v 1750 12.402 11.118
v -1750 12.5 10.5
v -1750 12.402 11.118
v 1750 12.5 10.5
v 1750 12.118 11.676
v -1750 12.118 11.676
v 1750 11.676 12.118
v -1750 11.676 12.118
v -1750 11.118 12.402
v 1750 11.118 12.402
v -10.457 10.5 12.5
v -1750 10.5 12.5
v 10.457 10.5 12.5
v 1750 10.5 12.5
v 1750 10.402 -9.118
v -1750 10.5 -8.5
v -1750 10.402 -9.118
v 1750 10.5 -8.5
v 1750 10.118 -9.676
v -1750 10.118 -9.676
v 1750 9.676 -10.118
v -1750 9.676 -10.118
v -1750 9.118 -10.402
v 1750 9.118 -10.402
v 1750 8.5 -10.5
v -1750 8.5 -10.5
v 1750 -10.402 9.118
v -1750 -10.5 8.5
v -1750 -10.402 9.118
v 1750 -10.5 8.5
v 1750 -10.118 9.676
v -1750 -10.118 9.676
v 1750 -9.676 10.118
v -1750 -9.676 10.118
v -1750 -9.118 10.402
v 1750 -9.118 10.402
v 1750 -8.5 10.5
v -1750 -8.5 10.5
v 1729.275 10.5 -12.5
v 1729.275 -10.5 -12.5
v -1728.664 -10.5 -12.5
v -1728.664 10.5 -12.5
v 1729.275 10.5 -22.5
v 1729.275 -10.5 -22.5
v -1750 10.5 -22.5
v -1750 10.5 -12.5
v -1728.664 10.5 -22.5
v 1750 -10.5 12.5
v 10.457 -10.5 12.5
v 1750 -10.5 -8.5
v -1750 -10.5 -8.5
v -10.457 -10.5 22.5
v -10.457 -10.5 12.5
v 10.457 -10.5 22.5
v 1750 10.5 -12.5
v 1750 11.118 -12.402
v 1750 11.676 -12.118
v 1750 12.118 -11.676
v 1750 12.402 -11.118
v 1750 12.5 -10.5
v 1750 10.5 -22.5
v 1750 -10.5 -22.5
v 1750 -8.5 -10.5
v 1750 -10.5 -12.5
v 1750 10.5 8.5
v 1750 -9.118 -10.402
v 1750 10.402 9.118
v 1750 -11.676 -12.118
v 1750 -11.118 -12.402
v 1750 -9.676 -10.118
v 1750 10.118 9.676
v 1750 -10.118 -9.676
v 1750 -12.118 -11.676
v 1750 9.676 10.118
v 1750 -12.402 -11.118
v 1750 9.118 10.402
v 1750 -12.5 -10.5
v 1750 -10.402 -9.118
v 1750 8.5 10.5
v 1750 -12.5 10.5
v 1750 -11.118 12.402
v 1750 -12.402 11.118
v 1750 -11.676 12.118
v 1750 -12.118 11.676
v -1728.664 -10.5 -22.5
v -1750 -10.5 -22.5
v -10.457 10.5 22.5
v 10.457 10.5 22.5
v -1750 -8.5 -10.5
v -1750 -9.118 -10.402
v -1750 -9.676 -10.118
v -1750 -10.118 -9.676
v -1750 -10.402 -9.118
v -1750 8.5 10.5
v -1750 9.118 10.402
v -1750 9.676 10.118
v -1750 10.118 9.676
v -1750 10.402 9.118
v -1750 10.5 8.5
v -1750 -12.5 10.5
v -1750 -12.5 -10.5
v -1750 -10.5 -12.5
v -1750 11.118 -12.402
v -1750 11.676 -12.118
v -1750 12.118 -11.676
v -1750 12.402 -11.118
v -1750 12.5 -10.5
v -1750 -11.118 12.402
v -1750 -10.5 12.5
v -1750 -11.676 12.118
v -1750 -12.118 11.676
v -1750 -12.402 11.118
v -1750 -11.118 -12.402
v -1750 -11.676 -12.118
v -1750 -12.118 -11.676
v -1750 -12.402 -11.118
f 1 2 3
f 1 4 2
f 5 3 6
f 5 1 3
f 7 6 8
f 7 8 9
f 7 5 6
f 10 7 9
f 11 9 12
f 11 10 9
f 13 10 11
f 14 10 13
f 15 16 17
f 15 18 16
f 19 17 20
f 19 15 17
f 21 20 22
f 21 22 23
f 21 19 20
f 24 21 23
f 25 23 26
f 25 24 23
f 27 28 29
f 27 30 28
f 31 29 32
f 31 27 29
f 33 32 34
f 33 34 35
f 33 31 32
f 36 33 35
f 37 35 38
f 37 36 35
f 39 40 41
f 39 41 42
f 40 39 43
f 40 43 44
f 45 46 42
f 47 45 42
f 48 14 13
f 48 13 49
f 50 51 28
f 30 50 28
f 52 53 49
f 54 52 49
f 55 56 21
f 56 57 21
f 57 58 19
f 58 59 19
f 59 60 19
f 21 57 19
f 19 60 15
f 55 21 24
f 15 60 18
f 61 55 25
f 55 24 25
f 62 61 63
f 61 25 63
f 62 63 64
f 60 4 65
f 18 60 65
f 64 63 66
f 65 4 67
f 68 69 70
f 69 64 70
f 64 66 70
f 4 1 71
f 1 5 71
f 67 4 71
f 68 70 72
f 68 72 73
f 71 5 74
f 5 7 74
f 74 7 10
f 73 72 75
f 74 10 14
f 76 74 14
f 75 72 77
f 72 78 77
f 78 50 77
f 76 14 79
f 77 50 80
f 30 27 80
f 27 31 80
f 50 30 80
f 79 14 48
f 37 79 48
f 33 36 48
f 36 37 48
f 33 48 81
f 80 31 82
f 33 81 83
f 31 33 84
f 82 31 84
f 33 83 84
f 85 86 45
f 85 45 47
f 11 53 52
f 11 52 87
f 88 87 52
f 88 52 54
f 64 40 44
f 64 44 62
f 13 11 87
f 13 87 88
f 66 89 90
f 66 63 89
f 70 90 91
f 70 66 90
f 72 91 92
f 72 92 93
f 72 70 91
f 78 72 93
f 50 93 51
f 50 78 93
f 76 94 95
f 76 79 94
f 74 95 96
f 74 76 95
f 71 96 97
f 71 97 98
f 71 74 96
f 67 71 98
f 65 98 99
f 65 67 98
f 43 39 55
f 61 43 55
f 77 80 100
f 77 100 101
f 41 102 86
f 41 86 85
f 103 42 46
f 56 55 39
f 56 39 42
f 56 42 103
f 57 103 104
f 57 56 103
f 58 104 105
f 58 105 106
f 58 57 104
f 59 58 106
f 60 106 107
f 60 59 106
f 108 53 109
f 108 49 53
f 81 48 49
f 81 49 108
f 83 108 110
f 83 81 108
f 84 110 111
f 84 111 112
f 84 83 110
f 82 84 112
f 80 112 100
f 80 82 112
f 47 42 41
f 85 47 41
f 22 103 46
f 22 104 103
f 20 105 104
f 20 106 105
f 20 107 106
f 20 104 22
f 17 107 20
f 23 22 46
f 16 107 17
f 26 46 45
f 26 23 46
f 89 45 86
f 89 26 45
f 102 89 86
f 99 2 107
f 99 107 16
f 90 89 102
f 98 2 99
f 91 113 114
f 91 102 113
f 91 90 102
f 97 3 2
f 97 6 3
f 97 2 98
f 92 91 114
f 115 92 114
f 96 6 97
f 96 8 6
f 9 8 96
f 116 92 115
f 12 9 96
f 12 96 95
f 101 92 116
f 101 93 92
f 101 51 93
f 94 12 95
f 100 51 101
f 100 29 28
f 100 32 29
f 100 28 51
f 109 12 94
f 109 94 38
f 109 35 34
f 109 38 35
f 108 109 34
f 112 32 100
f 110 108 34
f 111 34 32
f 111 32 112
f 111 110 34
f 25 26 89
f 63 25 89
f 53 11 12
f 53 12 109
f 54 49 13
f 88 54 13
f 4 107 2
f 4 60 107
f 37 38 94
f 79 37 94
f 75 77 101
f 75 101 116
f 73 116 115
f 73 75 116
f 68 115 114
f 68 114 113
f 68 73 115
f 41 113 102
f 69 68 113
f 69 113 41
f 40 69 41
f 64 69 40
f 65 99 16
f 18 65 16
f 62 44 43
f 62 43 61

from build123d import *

# Parameters (mm, degrees)
F1_DEPTH = 1750
F2_W     = 20.913882
F2_H     = 21
F3_DEPTH = 10
F4_W     = 21.33584
F4_H     = 21
F5_DEPTH = 10
F4_W_2   = 20.724654
F6_DEPTH = 10


with BuildPart() as f1:
    # F0 (on Right) → F1 (new body, symmetric)
    with BuildSketch(Plane.YZ):
        with BuildLine():
            ThreePointArc((12.5, 10.5), (11.914214, 11.914214), (10.5, 12.5))
            Line((10.5, 12.5), (-10.5, 12.5))
            ThreePointArc((-10.5, 12.5), (-11.914214, 11.914214), (-12.5, 10.5))
            Line((-12.5, 10.5), (-12.5, -10.5))
            ThreePointArc((-12.5, -10.5), (-11.914214, -11.914214), (-10.5, -12.5))
            Line((-10.5, -12.5), (10.5, -12.5))
            ThreePointArc((10.5, -12.5), (11.914214, -11.914214), (12.5, -10.5))
            Line((12.5, -10.5), (12.5, 10.5))
        make_face()
        with BuildLine():
            Line((-8.5, 10.5), (8.5, 10.5))
            ThreePointArc((8.5, 10.5), (9.914214, 9.914214), (10.5, 8.5))
            Line((10.5, 8.5), (10.5, -8.5))
            ThreePointArc((10.5, -8.5), (9.914214, -9.914214), (8.5, -10.5))
            Line((8.5, -10.5), (-8.5, -10.5))
            ThreePointArc((-8.5, -10.5), (-9.914214, -9.914214), (-10.5, -8.5))
            Line((-10.5, -8.5), (-10.5, 8.5))
            ThreePointArc((-10.5, 8.5), (-9.914214, 9.914214), (-8.5, 10.5))
        make_face(mode=Mode.SUBTRACT)
    extrude(amount=F1_DEPTH, both=True)

    # F2 (on face) → F3 (join)
    with BuildSketch(Plane.XY.offset(12.5)):
        Rectangle(F2_W, F2_H)
    extrude(amount=F3_DEPTH)

    # F4 (on face) → F5 (join)
    with BuildSketch(Plane(origin=(0, 0, -12.5), x_dir=(1, 0, 0), z_dir=(0, 0, -1))):
        with Locations((-1739.33208, 0)):
            Rectangle(F4_W, F4_H)
    extrude(amount=F5_DEPTH)

    # F4 (on face) → F6 (join)
    with BuildSketch(Plane(origin=(0, 0, -12.5), x_dir=(1, 0, 0), z_dir=(0, 0, -1))):
        with Locations((1739.637673, 0)):
            Rectangle(F4_W_2, F4_H)
    extrude(amount=F6_DEPTH)


solid = f1.part
